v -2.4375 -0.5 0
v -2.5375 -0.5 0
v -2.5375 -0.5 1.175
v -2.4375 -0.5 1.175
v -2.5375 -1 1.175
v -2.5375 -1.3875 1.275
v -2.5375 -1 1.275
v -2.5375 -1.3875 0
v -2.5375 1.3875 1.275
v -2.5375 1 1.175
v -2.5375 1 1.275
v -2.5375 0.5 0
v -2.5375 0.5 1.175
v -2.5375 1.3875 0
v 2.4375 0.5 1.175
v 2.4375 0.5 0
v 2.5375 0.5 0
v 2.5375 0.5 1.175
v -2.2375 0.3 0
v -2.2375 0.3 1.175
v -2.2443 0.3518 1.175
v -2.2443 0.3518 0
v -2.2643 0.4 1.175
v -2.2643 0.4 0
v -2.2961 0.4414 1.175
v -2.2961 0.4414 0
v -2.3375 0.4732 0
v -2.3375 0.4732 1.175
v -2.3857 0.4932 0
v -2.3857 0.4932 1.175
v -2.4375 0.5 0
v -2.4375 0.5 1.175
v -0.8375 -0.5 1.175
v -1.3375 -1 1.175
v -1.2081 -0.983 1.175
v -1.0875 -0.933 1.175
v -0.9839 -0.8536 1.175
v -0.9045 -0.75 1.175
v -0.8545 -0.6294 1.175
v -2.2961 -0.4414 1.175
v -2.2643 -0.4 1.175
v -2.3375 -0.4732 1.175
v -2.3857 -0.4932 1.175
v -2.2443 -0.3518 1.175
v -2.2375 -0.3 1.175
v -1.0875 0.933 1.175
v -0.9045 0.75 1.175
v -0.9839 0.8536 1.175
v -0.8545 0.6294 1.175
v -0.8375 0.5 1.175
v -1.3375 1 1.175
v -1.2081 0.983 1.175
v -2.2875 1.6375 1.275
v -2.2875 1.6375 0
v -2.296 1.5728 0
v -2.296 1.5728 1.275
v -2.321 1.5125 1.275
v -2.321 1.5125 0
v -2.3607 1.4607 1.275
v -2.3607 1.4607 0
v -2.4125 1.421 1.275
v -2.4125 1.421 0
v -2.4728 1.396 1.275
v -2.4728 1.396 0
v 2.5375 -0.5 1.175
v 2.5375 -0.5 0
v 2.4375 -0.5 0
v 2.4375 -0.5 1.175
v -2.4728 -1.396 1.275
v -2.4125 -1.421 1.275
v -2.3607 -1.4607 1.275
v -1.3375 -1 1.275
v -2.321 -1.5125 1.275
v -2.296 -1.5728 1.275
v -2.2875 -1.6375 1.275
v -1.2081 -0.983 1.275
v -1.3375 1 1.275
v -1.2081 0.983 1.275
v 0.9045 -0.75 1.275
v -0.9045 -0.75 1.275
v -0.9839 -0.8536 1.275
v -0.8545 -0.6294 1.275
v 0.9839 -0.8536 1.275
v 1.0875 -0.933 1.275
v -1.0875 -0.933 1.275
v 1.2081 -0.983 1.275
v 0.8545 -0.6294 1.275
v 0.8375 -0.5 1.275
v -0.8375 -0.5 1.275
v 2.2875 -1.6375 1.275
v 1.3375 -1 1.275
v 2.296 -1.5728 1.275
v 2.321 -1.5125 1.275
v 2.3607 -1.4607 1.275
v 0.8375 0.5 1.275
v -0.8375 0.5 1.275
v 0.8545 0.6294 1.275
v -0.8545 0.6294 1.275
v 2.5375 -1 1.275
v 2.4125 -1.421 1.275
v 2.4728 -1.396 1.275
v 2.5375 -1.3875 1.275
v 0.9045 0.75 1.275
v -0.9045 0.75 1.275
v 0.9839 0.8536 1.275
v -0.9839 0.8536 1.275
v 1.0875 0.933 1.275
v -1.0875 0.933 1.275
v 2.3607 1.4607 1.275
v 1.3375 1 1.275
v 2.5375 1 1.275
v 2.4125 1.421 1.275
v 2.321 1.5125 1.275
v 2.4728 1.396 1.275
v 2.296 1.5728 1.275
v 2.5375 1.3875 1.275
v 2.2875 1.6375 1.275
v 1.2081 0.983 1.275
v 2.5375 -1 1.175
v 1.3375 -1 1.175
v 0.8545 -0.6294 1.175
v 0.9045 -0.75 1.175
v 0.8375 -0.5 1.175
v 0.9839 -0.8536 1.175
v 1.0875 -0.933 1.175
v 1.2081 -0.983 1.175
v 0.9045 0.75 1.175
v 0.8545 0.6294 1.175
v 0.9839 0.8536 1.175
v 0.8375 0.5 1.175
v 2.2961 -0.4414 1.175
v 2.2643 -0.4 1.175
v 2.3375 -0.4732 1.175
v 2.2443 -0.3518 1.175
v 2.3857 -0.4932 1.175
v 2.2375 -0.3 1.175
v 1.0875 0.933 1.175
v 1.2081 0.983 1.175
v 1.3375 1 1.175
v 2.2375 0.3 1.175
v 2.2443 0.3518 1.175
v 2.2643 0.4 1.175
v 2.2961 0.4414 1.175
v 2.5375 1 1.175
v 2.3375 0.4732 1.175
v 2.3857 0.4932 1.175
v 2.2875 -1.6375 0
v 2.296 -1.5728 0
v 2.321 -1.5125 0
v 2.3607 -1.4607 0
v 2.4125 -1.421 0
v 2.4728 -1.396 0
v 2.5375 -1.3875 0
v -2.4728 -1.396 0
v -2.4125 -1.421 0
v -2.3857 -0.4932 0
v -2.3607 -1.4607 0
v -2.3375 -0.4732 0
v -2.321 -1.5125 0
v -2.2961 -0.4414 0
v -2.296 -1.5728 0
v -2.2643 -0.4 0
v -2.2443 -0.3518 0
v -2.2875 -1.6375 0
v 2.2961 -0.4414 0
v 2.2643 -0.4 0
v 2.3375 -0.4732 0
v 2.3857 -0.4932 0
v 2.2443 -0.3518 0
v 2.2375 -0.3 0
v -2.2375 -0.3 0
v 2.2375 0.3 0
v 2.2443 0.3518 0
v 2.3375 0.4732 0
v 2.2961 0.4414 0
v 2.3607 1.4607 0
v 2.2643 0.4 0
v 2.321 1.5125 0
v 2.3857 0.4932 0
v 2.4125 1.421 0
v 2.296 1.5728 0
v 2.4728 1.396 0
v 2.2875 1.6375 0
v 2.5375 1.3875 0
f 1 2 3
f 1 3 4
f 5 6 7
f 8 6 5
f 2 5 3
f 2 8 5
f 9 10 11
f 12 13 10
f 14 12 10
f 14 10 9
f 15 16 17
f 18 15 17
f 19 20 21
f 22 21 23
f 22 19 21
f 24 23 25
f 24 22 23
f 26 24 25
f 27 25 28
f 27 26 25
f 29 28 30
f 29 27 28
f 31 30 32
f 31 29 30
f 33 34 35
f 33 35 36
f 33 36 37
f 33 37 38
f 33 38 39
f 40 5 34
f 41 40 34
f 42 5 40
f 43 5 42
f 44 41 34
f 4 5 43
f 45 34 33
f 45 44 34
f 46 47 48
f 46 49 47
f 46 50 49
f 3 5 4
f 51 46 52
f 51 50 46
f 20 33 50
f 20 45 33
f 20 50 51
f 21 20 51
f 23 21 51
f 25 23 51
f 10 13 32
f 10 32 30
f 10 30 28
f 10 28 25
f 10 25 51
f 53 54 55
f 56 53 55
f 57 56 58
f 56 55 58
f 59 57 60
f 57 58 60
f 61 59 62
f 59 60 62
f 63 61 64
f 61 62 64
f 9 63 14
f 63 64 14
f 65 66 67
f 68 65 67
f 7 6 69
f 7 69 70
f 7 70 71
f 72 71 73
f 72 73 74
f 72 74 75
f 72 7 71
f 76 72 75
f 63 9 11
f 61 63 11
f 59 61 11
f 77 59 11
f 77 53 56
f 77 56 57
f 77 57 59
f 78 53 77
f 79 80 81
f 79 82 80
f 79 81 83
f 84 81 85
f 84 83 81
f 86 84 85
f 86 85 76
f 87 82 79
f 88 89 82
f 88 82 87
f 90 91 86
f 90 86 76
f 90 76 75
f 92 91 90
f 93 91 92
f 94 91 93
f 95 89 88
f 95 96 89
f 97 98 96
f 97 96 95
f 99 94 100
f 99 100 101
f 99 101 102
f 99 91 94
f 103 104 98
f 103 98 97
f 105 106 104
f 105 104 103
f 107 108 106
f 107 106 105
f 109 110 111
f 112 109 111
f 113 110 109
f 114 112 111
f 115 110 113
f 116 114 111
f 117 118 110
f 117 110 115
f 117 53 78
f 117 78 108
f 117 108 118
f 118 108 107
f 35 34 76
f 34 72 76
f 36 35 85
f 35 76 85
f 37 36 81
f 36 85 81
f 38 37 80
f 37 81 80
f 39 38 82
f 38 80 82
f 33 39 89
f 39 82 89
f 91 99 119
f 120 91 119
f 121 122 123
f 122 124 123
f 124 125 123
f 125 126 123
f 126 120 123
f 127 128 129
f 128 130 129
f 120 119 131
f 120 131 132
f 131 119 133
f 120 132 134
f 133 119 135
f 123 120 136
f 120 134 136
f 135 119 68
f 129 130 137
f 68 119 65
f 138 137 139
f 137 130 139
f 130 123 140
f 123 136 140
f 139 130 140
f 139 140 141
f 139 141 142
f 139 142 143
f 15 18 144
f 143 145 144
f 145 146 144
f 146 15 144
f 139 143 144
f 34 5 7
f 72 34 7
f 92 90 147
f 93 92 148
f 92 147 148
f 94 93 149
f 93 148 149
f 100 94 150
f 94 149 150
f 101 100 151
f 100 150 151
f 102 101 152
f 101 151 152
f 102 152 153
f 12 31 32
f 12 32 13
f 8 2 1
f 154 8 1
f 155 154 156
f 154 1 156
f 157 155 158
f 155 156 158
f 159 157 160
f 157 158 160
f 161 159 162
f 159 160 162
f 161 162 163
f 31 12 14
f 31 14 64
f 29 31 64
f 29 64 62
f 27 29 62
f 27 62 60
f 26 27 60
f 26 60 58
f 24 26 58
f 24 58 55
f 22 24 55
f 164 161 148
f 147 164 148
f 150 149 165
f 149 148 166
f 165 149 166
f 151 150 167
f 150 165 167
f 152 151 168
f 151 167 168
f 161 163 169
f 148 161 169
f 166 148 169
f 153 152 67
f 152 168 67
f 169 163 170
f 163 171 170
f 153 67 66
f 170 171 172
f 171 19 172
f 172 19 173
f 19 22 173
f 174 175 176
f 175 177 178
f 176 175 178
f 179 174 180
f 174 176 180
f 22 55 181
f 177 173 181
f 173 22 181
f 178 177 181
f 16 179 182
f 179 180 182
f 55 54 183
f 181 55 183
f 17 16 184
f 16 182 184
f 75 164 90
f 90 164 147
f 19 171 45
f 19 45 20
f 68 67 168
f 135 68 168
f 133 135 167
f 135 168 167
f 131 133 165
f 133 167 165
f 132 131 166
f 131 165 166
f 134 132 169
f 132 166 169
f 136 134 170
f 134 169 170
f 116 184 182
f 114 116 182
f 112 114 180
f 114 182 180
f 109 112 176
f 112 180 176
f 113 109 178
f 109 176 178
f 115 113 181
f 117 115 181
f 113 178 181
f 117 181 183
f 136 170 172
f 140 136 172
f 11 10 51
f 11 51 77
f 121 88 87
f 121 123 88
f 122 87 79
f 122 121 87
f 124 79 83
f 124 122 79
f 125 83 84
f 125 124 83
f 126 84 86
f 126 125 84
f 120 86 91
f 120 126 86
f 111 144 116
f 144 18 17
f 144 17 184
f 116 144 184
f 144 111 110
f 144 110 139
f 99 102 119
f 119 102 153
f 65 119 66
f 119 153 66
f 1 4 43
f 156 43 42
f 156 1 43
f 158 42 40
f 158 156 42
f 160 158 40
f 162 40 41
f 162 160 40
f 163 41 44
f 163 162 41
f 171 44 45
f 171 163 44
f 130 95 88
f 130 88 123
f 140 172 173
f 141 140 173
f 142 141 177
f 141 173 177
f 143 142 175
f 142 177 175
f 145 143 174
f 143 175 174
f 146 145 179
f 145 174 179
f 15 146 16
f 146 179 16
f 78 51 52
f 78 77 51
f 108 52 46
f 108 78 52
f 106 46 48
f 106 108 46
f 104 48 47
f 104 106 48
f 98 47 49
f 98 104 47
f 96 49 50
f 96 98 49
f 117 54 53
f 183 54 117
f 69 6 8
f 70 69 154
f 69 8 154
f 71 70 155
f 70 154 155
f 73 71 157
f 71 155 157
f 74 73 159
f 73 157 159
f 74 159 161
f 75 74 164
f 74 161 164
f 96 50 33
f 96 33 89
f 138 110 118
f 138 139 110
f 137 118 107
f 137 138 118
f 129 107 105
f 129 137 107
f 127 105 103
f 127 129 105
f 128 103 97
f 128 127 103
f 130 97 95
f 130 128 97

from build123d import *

# Parameters (mm, degrees)
IZIM1_W                     = 5.075
IZIM1_H                     = 3.275
Y_KSEKLIK_EKSTR_ZYON1_DEPTH = 1.275
IZIM2_W                     = 0.1
IZIM2_H                     = 2
KES_EKSTR_ZYON1_DEPTH       = 1.7
IZIM3_W                     = 0.1
IZIM3_H                     = 2
KES_EKSTR_ZYON2_DEPTH       = 1.7
KES_EKSTR_ZYON3_DEPTH       = 1.7
IZIM5_R                     = 0.25
KES_EKSTR_ZYON4_DEPTH       = 1.7
RADYUS1_R                   = 0.5


with BuildPart() as part:
    # Çizim1 → Yükseklik-Ekstrüzyon1 (new body)
    with BuildSketch(Plane.XY):
        Rectangle(IZIM1_W, IZIM1_H)
    extrude(amount=Y_KSEKLIK_EKSTR_ZYON1_DEPTH)

    # Çizim2 → Kes-Ekstrüzyon1 (cut)
    with BuildSketch(Plane(origin=(2.5375, 0, 0), x_dir=(0, 0, -1), z_dir=(1, 0, 0))):
        with Locations((-1.225, 0)):
            Rectangle(IZIM2_W, IZIM2_H)
    extrude(amount=-KES_EKSTR_ZYON1_DEPTH, mode=Mode.SUBTRACT)

    # Çizim3 → Kes-Ekstrüzyon2 (cut)
    with BuildSketch(Plane.ZY.offset(2.5375)):
        with Locations((1.225, 0)):
            Rectangle(IZIM3_W, IZIM3_H)
    extrude(amount=-KES_EKSTR_ZYON2_DEPTH, mode=Mode.SUBTRACT)

    # Çizim4 → Kes-Ekstrüzyon3 (cut)
    with BuildSketch(Plane(origin=(0, 0, 0), x_dir=(-1, 0, 0), z_dir=(0, 0, -1))):
        with BuildLine():
            Line((-2.2375, -0.3), (-2.2375, 0.3))
            ThreePointArc((-2.2375, 0.3), (-2.296078644, 0.441421356), (-2.4375, 0.5))
            Line((-2.4375, 0.5), (-2.5375, 0.5))
            Line((-2.5375, 0.5), (-2.5375, -0.5))
            Line((-2.5375, -0.5), (-2.4375, -0.5))
            ThreePointArc((-2.4375, -0.5), (-2.296078644, -0.441421356), (-2.2375, -0.3))
        make_face()
        with BuildLine():
            Line((2.2375, -0.3), (2.2375, 0.3))
            ThreePointArc((2.2375, 0.3), (2.296078644, 0.441421356), (2.4375, 0.5))
            Line((2.4375, 0.5), (2.5375, 0.5))
            Line((2.5375, 0.5), (2.5375, -0.5))
            Line((2.5375, -0.5), (2.4375, -0.5))
            ThreePointArc((2.4375, -0.5), (2.296078644, -0.441421356), (2.2375, -0.3))
        make_face()
    extrude(amount=-KES_EKSTR_ZYON3_DEPTH, mode=Mode.SUBTRACT)

    # Çizim5 → Kes-Ekstrüzyon4 (cut)
    with BuildSketch(Plane(origin=(0, 0, 0), x_dir=(-1, 0, 0), z_dir=(0, 0, -1))):
        with Locations((-2.5375, 1.6375)):
            Circle(IZIM5_R)
        with Locations((2.5375, 1.6375)):
            Circle(IZIM5_R)
        with Locations((2.5375, -1.6375)):
            Circle(IZIM5_R)
        with Locations((-2.5375, -1.6375)):
            Circle(IZIM5_R)
    extrude(amount=-KES_EKSTR_ZYON4_DEPTH, mode=Mode.SUBTRACT)

    # Radyus1
    radyus1_edges = [part.edges().sort_by_distance(p)[0] for p in [
        (0.8375, -1, 1.225),
        (0.8375, 1, 1.225),
        (-0.8375, 1, 1.225),
        (-0.8375, -1, 1.225),
    ]]
    fillet(radyus1_edges, radius=RADYUS1_R)


solid = part.part
